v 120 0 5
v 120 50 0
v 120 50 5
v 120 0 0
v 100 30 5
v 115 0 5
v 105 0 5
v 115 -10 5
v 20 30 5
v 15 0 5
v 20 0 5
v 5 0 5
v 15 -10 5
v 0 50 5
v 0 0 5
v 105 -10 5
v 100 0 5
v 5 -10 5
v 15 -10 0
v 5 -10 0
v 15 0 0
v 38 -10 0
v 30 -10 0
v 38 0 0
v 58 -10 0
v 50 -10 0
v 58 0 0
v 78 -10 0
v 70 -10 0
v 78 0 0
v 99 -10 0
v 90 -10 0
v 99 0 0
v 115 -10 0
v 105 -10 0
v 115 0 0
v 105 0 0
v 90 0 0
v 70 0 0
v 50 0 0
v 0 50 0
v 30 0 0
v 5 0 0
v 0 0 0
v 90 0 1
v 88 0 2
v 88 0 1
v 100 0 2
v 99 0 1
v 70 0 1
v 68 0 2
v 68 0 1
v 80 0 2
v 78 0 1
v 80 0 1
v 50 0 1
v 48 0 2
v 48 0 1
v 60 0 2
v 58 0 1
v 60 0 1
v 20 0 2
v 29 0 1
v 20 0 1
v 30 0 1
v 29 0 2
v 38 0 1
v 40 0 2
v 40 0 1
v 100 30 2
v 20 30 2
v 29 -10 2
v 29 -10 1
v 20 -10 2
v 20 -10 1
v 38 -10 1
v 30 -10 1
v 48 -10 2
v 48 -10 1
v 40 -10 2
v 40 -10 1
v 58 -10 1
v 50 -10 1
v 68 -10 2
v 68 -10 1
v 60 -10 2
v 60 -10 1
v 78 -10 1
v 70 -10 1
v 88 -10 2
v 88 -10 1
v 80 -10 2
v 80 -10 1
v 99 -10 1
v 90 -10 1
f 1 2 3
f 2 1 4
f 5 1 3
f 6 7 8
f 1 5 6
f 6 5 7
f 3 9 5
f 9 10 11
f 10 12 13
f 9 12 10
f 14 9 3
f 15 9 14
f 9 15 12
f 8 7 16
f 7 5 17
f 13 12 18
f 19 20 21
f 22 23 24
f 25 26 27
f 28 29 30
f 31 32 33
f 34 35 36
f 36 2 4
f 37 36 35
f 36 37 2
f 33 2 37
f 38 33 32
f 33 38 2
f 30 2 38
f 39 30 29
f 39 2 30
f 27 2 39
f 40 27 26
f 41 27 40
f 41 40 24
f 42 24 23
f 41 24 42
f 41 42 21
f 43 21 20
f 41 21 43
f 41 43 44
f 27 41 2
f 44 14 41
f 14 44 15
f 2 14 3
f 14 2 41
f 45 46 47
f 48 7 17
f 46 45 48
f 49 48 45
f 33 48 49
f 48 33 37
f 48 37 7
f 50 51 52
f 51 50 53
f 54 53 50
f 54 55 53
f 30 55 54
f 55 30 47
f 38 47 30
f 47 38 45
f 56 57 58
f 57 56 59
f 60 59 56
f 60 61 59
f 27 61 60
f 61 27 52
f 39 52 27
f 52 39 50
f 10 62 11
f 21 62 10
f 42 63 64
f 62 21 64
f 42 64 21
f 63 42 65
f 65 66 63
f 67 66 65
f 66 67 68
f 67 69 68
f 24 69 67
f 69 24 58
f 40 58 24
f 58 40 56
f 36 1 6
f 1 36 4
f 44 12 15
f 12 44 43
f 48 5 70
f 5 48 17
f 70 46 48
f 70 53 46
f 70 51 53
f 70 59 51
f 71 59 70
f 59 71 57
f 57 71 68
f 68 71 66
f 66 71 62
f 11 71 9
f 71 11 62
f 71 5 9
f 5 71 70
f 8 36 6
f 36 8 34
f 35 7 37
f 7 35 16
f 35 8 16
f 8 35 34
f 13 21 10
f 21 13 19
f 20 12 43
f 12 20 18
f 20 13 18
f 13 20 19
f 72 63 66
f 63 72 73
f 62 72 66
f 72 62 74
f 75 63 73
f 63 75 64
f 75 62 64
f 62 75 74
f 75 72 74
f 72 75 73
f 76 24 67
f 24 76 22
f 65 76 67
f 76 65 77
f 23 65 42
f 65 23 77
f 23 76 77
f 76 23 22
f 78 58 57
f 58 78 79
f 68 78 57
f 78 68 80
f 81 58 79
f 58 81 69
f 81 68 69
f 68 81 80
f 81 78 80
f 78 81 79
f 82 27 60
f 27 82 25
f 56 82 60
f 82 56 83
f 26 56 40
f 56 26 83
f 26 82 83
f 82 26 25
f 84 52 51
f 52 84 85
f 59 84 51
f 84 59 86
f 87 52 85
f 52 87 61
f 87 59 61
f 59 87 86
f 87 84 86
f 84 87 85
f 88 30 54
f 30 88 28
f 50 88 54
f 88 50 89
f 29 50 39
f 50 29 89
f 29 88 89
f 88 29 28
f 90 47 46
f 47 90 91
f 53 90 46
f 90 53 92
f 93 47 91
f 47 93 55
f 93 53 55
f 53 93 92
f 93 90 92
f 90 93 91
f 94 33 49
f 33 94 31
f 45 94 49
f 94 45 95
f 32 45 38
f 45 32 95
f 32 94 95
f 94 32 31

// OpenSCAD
difference(){
  cube ([120, 50, 5]);
  translate ([20, -50, 2]) cube ([80 ,80 ,20]);
}
	translate ([105, -10, 0]) cube ([10 ,10,5]);
	translate ([5, -10, 0]) cube ([10,10,5]);
	translate ([20, -10, 1]) cube ([9 ,10 ,1]);
translate ([30, -10, 0]) cube ([8 ,10 ,1]);
translate ([40, -10, 1]) cube ([8 ,10 ,1]);
translate ([50, -10, 0]) cube ([8 ,10 ,1]);
translate ([60, -10, 1]) cube ([8 ,10 ,1]);
translate ([70, -10, 0]) cube ([8 ,10 ,1]);
translate ([80, -10, 1]) cube ([8 ,10 ,1]);
translate ([90, -10, 0]) cube ([9 ,10 ,1]);
 
